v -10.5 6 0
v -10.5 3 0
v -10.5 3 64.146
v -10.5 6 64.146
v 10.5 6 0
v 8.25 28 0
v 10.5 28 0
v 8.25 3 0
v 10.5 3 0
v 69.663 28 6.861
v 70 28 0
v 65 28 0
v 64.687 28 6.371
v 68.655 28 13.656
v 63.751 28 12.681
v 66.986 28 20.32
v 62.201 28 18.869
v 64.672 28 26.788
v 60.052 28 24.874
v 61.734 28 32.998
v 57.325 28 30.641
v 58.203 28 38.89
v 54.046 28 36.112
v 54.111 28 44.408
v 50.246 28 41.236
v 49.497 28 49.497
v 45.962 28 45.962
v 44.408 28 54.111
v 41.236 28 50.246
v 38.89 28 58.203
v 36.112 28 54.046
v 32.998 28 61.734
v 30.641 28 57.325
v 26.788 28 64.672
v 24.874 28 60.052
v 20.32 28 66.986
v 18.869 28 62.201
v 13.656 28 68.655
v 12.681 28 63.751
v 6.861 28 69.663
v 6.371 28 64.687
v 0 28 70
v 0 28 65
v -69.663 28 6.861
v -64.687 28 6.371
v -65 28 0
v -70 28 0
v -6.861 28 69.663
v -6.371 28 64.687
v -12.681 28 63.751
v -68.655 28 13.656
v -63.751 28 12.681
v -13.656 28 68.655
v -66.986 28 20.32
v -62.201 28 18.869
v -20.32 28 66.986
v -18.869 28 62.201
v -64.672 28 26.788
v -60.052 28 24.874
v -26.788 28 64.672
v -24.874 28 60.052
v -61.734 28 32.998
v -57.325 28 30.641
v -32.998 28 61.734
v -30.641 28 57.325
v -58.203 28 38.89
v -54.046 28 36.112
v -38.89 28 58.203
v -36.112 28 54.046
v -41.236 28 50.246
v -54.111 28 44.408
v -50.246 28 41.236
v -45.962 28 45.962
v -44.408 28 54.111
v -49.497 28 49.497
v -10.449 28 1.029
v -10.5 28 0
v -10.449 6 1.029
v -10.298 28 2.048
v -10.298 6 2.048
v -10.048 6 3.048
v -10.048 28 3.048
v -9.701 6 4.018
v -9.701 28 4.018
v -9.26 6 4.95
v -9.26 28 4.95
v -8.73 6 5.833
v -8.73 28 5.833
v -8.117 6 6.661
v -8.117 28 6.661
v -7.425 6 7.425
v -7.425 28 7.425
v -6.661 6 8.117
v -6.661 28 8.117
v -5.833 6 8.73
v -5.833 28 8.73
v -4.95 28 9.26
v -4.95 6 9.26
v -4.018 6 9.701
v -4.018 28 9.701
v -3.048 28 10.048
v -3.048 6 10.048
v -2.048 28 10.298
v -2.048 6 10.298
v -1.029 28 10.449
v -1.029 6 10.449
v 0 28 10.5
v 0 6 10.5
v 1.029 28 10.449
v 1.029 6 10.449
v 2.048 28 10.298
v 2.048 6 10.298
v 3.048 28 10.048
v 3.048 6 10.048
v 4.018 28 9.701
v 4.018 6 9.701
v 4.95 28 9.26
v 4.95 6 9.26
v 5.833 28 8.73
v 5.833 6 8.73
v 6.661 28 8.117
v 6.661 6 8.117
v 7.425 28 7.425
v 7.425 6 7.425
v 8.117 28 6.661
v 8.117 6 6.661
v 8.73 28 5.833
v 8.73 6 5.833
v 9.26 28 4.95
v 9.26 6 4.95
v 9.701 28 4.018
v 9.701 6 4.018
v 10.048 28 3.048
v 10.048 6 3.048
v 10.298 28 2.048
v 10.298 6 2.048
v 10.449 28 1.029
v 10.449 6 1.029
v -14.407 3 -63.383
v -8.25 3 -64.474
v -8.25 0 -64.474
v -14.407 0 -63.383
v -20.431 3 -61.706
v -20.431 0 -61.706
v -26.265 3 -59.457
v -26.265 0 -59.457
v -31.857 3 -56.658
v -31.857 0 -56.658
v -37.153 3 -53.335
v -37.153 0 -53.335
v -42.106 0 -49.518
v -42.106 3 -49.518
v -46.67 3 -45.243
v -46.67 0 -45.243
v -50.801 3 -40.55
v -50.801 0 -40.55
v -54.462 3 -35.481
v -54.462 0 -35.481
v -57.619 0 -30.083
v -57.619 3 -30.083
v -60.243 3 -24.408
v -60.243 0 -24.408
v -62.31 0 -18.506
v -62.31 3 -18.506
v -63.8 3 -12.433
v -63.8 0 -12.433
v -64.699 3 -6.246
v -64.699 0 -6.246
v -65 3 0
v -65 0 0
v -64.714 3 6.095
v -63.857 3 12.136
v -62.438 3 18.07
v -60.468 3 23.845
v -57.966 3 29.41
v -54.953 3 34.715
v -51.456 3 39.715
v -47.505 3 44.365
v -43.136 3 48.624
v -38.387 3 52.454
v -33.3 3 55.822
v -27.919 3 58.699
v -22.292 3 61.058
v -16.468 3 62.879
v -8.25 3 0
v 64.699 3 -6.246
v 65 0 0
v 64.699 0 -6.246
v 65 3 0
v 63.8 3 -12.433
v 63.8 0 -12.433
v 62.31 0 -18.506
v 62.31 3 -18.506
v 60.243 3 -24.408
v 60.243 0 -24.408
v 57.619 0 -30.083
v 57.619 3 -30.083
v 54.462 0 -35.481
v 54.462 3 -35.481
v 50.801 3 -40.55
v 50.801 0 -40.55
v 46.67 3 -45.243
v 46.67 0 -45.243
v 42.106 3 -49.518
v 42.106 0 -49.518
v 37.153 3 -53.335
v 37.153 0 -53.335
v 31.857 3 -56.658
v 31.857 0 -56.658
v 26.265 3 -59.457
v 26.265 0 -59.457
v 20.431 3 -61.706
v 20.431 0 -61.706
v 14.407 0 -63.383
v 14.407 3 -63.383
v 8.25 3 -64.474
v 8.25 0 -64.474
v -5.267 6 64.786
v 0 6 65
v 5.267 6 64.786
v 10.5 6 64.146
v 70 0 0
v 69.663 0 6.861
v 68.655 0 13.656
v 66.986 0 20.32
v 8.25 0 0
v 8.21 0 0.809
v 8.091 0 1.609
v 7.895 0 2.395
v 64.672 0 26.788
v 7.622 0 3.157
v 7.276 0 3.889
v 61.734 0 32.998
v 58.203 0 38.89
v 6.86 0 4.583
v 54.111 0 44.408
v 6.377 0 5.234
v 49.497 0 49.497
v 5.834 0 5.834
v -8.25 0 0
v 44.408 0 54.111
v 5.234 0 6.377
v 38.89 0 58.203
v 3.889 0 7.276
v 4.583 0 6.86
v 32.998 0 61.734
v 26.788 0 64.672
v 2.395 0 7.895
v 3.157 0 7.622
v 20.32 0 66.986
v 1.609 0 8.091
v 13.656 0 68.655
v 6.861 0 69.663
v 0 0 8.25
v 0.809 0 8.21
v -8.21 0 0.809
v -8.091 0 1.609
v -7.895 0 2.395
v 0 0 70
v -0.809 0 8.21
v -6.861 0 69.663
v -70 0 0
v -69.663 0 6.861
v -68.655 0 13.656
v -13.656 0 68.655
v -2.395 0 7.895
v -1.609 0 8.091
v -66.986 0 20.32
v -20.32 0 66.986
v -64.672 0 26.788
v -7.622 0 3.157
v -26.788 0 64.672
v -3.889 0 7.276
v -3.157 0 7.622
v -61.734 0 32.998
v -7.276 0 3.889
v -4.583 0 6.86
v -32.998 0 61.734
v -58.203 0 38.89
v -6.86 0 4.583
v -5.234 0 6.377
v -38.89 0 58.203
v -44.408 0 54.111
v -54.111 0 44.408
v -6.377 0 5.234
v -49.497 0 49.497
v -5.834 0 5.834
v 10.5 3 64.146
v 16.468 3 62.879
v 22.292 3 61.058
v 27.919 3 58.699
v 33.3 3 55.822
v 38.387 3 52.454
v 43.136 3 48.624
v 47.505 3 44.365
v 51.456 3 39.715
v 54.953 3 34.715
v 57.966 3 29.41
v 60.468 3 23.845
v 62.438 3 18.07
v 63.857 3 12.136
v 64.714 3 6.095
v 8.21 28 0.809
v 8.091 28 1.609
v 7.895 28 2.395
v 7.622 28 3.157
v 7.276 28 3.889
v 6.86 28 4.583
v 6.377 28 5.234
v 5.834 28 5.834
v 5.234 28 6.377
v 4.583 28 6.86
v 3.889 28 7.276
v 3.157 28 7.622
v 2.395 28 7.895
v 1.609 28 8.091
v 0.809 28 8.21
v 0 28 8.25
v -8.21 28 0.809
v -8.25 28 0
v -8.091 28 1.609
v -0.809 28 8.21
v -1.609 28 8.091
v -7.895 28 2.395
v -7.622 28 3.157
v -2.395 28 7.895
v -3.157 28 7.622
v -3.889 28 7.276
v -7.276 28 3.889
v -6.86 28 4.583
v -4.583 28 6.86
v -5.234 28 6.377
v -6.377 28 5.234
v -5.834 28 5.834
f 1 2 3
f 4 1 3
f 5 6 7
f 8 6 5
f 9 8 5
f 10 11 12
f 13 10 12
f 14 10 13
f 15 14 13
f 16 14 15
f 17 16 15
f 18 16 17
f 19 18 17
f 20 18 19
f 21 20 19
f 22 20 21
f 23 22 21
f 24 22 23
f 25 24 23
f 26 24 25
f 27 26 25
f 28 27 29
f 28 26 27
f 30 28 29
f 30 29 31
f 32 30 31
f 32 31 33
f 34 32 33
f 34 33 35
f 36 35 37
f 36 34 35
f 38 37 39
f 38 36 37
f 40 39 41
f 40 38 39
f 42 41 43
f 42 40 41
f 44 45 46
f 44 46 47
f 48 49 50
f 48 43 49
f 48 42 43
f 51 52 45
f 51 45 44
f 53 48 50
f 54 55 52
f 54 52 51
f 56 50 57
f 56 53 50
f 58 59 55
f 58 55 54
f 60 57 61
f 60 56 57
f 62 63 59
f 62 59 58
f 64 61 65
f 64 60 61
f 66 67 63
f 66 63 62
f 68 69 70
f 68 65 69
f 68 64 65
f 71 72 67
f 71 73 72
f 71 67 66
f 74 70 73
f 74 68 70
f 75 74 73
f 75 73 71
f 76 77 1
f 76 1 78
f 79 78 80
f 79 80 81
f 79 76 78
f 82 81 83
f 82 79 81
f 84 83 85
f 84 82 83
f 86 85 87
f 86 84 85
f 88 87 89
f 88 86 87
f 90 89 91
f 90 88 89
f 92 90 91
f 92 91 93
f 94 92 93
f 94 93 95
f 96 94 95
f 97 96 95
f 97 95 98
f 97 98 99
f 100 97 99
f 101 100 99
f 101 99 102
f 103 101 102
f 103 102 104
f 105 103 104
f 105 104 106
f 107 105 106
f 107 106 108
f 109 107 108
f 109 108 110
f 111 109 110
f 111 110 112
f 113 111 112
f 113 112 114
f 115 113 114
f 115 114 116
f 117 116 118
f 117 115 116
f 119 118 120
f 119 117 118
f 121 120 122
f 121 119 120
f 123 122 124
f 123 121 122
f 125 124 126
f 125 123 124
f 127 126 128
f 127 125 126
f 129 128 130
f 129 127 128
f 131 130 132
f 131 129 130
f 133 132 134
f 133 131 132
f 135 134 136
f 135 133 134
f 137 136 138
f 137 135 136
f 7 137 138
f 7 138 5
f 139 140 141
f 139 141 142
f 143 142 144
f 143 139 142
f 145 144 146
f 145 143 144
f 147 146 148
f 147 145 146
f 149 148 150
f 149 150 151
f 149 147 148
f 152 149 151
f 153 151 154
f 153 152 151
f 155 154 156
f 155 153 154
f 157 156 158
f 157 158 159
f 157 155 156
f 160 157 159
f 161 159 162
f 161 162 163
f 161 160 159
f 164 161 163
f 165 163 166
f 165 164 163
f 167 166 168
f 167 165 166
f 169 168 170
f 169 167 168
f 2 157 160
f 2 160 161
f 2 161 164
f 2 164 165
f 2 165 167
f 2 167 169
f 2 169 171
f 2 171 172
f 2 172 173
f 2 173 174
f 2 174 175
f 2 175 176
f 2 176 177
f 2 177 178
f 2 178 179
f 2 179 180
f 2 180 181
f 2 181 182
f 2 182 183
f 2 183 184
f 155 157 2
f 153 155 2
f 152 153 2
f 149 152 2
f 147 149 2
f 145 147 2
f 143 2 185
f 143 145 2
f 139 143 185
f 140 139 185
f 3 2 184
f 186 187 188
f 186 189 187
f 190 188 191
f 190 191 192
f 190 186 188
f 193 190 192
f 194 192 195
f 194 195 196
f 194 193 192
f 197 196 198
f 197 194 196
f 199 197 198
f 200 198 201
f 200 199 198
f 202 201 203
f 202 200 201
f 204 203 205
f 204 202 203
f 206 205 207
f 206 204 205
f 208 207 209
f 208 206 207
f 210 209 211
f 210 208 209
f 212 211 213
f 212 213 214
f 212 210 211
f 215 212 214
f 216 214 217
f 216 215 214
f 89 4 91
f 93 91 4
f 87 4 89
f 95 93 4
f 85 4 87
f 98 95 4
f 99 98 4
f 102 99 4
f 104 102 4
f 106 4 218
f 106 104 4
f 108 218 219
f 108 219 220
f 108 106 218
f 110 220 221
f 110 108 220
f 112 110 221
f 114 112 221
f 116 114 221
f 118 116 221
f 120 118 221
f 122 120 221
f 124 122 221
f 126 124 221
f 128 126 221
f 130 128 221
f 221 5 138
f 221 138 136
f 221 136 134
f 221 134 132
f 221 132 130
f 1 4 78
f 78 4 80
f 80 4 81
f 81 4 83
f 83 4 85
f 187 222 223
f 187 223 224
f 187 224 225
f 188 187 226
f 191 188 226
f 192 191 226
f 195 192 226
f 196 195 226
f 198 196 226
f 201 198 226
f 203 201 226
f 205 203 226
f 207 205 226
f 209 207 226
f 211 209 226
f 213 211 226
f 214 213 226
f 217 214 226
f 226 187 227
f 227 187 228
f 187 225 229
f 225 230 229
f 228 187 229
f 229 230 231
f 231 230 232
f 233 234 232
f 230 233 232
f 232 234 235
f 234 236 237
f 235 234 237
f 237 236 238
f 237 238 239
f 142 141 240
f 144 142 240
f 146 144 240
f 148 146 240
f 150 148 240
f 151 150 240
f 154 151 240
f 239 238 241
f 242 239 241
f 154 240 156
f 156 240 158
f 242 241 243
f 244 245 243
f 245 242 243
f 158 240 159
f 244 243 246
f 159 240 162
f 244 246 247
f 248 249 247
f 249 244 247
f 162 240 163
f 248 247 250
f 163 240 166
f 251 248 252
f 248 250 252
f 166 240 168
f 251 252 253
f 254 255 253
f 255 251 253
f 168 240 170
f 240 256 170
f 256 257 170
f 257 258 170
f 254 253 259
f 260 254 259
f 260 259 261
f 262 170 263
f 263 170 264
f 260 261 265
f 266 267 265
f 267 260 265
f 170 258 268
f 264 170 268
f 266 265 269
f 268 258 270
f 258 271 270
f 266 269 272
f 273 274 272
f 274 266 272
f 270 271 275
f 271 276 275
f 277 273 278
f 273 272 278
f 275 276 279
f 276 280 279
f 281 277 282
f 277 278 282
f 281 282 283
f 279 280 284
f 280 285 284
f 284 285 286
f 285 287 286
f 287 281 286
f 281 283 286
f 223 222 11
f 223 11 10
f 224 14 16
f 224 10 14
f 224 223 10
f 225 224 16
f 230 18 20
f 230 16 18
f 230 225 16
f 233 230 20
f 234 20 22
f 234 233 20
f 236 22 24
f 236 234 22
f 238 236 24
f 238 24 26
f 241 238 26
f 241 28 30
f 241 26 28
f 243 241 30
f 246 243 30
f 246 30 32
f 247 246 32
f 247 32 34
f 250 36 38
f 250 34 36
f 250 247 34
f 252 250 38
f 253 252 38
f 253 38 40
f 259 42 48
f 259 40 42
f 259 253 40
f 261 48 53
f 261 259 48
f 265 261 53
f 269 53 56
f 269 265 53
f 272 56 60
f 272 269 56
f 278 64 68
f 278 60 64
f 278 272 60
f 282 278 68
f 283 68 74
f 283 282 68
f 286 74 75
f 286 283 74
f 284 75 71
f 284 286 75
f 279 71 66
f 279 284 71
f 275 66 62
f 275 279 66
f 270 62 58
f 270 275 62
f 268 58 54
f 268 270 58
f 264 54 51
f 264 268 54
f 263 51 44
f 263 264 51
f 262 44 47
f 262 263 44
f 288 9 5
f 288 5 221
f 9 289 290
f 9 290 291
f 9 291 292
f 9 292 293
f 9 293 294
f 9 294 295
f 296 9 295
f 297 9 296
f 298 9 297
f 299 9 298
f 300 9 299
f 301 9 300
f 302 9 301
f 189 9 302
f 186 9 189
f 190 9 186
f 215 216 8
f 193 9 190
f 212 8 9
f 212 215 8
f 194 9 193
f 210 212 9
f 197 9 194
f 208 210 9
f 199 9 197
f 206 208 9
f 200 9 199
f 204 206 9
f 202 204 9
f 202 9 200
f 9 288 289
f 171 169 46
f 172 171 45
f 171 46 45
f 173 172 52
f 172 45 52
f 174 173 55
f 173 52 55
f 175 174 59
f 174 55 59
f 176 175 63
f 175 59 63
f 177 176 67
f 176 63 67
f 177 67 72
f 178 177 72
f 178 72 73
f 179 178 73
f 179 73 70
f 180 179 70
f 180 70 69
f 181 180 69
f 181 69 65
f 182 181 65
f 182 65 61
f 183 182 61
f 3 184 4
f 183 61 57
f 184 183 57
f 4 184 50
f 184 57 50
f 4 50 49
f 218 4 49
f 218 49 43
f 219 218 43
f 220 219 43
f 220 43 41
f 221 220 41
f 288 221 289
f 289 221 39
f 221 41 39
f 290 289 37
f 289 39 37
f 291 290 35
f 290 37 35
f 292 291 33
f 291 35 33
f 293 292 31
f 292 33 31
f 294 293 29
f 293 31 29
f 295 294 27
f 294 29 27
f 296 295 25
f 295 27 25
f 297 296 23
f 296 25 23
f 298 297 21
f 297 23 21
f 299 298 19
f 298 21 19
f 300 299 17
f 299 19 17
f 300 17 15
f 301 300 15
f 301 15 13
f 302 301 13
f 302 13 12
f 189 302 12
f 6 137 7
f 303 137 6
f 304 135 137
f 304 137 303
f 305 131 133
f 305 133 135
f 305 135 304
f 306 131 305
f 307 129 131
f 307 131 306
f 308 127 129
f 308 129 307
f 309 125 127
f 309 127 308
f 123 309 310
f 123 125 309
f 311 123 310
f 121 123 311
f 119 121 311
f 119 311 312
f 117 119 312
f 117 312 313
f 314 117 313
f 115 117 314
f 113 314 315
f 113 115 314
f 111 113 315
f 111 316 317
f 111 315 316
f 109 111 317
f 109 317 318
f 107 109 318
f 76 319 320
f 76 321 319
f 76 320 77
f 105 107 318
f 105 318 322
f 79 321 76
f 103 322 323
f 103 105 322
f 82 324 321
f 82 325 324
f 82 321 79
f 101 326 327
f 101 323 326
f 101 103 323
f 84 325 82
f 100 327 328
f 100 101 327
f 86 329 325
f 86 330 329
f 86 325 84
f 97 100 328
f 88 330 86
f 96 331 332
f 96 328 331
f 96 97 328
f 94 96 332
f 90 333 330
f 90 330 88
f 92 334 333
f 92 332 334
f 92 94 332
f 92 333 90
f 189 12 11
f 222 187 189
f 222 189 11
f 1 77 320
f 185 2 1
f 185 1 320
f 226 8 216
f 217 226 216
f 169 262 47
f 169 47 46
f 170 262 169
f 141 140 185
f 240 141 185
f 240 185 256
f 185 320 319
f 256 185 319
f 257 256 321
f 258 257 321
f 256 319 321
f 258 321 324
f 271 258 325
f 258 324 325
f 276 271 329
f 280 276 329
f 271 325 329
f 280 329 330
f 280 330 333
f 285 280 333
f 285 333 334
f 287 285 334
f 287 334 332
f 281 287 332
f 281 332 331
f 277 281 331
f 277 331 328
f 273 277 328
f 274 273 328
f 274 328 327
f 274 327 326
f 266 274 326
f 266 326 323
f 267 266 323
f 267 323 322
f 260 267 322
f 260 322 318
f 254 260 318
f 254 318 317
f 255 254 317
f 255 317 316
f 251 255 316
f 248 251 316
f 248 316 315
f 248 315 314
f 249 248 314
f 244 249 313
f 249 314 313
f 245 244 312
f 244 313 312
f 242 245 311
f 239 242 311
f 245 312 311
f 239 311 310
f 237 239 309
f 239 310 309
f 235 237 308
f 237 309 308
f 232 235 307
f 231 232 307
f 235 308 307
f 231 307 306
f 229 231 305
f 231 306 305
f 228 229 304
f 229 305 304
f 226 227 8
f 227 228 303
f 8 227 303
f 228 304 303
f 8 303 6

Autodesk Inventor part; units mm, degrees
ref_plane "YZ Plane" through (0, 0, 0) normal (1, 0, 0) x (0, 1, 0)
ref_plane "XZ Plane" through (0, 0, 0) normal (0, 1, 0) x (-1, 0, 0)
ref_plane "XY Plane" through (0, 0, 0) normal (0, 0, 1) x (1, 0, 0)
sketch "Sketch1" plane through (0, 0, 0) normal (0, 1, 0) x (-1, 0, 0)
  circle A0 centre (0, 0) radius 70
  dimension "d0" = 140
extrude "Extrusion1" add sketch "Sketch1" along normal blind 28
sketch "Sketch2" plane through (0, 28, 0) normal (0, 1, 0) x (1, 0, 0)
  circle A0 centre (0, 0) radius 8.25
  dimension "d3" = 16.5
extrude "Extrusion2" cut sketch "Sketch2" against normal blind 28
sketch "Sketch3" plane through (0, 28, 0) normal (0, 1, 0) x (1, 0, 0)
  circle A0 centre (0, 0) radius 8.25
  circle A1 centre (0, 0) radius 65
  circle A2 centre (0, 0) radius 10.5
  dimension "d6" = 130
  dimension "d7" = 21
extrude "Extrusion3" cut sketch "Sketch3" against normal blind 25 contours A1
sketch "Sketch4" plane through (0, 3, 0) normal (0, 1, 0) x (1, 0, 0)
  line L0 (-77.4845, 0) -> (88.5537, 0)
  line L1 (88.5537, 0) -> (88.5537, 100.8261)
  line L2 (88.5537, 100.8261) -> (-77.4845, 100.8261)
  line L3 (-77.4845, 100.8261) -> (-77.4845, 0)
  point P0 (0, 0)
  point P1 (0, 0)
extrude "Extrusion4" cut sketch "Sketch4" along normal blind 220
sketch "Sketch5" plane through (0, 3, 0) normal (0, 1, 0) x (1, 0, 0)
  arc A0 (-10.5, 0) -> (10.5, 0) centre (0, 0) ccw projected
  arc A1 (-65, 0) -> (65, 0) centre (0, 0) ccw projected
  arc A2 (-10.5, 0) -> (10.5, 0) centre (0, 0) ccw projected
  line L0 (10.5, 0) -> (10.5, -64.1463)
  line L1 (-10.5, 0) -> (-10.5, -64.1463)
  arc A3 (-10.5, -64.1463) -> (10.5, -64.1463) centre (0, 0) ccw
  arc A4 (-10.5, 0) -> (10.5, 0) centre (0, 0) ccw
extrude "Extrusion5" add sketch "Sketch5" along normal blind 3
sketch "Sketch6" plane through (0, 28, 0) normal (0, 1, 0) x (1, 0, 0)
  line L0 (-8.25, 0) -> (-10.5, 0) projected
  line L1 (-8.25, 0) -> (8.25, 0)
  line L2 (8.25, 0) -> (8.25, 75.2128)
  line L3 (8.25, 75.2128) -> (-8.25, 75.2128)
  line L4 (-8.25, 75.2128) -> (-8.25, 0)
  point P0 (0, 0)
  dimension "d14" = 16.5
extrude "Extrusion6" cut sketch "Sketch6" against normal blind 30
sketch "Sketch8" plane through (0, 3, 0) normal (0, 1, 0) x (1, 0, 0)
  arc A0 (-65, 0) -> (65, 0) centre (0, 0) ccw
  line L0 (65, 0) -> (70, 0)
  arc A1 (70, 0) -> (-70, 0) centre (0, 0) ccw
  line L1 (-70, 0) -> (-65, 0)
  arc A2 (-10.5, 0) -> (10.5, 0) centre (0, 0) ccw
  line L2 (-10.5, 0) -> (-8.25, 0)
  arc A3 (8.25, 0) -> (-8.25, 0) centre (0, 0) ccw
  line L3 (8.25, 0) -> (10.5, 0)
  circle A4 centre (0, 0) radius 8.25
  arc A5 (65, 0) -> (-65, 0) centre (0, 0) ccw
  line L4 (-65, 0) -> (-70, 0)
  line L5 (65, 0) -> (70, 0)
  arc A6 (70, 0) -> (-70, 0) centre (0, 0) ccw
  arc A7 (70, 0) -> (70, 0) centre (0, 0) ccw
extrude "Extrusion7" cut sketch "Sketch8" against normal blind 30 contours L1 A1 L0 A5
properties part number "casept2"
